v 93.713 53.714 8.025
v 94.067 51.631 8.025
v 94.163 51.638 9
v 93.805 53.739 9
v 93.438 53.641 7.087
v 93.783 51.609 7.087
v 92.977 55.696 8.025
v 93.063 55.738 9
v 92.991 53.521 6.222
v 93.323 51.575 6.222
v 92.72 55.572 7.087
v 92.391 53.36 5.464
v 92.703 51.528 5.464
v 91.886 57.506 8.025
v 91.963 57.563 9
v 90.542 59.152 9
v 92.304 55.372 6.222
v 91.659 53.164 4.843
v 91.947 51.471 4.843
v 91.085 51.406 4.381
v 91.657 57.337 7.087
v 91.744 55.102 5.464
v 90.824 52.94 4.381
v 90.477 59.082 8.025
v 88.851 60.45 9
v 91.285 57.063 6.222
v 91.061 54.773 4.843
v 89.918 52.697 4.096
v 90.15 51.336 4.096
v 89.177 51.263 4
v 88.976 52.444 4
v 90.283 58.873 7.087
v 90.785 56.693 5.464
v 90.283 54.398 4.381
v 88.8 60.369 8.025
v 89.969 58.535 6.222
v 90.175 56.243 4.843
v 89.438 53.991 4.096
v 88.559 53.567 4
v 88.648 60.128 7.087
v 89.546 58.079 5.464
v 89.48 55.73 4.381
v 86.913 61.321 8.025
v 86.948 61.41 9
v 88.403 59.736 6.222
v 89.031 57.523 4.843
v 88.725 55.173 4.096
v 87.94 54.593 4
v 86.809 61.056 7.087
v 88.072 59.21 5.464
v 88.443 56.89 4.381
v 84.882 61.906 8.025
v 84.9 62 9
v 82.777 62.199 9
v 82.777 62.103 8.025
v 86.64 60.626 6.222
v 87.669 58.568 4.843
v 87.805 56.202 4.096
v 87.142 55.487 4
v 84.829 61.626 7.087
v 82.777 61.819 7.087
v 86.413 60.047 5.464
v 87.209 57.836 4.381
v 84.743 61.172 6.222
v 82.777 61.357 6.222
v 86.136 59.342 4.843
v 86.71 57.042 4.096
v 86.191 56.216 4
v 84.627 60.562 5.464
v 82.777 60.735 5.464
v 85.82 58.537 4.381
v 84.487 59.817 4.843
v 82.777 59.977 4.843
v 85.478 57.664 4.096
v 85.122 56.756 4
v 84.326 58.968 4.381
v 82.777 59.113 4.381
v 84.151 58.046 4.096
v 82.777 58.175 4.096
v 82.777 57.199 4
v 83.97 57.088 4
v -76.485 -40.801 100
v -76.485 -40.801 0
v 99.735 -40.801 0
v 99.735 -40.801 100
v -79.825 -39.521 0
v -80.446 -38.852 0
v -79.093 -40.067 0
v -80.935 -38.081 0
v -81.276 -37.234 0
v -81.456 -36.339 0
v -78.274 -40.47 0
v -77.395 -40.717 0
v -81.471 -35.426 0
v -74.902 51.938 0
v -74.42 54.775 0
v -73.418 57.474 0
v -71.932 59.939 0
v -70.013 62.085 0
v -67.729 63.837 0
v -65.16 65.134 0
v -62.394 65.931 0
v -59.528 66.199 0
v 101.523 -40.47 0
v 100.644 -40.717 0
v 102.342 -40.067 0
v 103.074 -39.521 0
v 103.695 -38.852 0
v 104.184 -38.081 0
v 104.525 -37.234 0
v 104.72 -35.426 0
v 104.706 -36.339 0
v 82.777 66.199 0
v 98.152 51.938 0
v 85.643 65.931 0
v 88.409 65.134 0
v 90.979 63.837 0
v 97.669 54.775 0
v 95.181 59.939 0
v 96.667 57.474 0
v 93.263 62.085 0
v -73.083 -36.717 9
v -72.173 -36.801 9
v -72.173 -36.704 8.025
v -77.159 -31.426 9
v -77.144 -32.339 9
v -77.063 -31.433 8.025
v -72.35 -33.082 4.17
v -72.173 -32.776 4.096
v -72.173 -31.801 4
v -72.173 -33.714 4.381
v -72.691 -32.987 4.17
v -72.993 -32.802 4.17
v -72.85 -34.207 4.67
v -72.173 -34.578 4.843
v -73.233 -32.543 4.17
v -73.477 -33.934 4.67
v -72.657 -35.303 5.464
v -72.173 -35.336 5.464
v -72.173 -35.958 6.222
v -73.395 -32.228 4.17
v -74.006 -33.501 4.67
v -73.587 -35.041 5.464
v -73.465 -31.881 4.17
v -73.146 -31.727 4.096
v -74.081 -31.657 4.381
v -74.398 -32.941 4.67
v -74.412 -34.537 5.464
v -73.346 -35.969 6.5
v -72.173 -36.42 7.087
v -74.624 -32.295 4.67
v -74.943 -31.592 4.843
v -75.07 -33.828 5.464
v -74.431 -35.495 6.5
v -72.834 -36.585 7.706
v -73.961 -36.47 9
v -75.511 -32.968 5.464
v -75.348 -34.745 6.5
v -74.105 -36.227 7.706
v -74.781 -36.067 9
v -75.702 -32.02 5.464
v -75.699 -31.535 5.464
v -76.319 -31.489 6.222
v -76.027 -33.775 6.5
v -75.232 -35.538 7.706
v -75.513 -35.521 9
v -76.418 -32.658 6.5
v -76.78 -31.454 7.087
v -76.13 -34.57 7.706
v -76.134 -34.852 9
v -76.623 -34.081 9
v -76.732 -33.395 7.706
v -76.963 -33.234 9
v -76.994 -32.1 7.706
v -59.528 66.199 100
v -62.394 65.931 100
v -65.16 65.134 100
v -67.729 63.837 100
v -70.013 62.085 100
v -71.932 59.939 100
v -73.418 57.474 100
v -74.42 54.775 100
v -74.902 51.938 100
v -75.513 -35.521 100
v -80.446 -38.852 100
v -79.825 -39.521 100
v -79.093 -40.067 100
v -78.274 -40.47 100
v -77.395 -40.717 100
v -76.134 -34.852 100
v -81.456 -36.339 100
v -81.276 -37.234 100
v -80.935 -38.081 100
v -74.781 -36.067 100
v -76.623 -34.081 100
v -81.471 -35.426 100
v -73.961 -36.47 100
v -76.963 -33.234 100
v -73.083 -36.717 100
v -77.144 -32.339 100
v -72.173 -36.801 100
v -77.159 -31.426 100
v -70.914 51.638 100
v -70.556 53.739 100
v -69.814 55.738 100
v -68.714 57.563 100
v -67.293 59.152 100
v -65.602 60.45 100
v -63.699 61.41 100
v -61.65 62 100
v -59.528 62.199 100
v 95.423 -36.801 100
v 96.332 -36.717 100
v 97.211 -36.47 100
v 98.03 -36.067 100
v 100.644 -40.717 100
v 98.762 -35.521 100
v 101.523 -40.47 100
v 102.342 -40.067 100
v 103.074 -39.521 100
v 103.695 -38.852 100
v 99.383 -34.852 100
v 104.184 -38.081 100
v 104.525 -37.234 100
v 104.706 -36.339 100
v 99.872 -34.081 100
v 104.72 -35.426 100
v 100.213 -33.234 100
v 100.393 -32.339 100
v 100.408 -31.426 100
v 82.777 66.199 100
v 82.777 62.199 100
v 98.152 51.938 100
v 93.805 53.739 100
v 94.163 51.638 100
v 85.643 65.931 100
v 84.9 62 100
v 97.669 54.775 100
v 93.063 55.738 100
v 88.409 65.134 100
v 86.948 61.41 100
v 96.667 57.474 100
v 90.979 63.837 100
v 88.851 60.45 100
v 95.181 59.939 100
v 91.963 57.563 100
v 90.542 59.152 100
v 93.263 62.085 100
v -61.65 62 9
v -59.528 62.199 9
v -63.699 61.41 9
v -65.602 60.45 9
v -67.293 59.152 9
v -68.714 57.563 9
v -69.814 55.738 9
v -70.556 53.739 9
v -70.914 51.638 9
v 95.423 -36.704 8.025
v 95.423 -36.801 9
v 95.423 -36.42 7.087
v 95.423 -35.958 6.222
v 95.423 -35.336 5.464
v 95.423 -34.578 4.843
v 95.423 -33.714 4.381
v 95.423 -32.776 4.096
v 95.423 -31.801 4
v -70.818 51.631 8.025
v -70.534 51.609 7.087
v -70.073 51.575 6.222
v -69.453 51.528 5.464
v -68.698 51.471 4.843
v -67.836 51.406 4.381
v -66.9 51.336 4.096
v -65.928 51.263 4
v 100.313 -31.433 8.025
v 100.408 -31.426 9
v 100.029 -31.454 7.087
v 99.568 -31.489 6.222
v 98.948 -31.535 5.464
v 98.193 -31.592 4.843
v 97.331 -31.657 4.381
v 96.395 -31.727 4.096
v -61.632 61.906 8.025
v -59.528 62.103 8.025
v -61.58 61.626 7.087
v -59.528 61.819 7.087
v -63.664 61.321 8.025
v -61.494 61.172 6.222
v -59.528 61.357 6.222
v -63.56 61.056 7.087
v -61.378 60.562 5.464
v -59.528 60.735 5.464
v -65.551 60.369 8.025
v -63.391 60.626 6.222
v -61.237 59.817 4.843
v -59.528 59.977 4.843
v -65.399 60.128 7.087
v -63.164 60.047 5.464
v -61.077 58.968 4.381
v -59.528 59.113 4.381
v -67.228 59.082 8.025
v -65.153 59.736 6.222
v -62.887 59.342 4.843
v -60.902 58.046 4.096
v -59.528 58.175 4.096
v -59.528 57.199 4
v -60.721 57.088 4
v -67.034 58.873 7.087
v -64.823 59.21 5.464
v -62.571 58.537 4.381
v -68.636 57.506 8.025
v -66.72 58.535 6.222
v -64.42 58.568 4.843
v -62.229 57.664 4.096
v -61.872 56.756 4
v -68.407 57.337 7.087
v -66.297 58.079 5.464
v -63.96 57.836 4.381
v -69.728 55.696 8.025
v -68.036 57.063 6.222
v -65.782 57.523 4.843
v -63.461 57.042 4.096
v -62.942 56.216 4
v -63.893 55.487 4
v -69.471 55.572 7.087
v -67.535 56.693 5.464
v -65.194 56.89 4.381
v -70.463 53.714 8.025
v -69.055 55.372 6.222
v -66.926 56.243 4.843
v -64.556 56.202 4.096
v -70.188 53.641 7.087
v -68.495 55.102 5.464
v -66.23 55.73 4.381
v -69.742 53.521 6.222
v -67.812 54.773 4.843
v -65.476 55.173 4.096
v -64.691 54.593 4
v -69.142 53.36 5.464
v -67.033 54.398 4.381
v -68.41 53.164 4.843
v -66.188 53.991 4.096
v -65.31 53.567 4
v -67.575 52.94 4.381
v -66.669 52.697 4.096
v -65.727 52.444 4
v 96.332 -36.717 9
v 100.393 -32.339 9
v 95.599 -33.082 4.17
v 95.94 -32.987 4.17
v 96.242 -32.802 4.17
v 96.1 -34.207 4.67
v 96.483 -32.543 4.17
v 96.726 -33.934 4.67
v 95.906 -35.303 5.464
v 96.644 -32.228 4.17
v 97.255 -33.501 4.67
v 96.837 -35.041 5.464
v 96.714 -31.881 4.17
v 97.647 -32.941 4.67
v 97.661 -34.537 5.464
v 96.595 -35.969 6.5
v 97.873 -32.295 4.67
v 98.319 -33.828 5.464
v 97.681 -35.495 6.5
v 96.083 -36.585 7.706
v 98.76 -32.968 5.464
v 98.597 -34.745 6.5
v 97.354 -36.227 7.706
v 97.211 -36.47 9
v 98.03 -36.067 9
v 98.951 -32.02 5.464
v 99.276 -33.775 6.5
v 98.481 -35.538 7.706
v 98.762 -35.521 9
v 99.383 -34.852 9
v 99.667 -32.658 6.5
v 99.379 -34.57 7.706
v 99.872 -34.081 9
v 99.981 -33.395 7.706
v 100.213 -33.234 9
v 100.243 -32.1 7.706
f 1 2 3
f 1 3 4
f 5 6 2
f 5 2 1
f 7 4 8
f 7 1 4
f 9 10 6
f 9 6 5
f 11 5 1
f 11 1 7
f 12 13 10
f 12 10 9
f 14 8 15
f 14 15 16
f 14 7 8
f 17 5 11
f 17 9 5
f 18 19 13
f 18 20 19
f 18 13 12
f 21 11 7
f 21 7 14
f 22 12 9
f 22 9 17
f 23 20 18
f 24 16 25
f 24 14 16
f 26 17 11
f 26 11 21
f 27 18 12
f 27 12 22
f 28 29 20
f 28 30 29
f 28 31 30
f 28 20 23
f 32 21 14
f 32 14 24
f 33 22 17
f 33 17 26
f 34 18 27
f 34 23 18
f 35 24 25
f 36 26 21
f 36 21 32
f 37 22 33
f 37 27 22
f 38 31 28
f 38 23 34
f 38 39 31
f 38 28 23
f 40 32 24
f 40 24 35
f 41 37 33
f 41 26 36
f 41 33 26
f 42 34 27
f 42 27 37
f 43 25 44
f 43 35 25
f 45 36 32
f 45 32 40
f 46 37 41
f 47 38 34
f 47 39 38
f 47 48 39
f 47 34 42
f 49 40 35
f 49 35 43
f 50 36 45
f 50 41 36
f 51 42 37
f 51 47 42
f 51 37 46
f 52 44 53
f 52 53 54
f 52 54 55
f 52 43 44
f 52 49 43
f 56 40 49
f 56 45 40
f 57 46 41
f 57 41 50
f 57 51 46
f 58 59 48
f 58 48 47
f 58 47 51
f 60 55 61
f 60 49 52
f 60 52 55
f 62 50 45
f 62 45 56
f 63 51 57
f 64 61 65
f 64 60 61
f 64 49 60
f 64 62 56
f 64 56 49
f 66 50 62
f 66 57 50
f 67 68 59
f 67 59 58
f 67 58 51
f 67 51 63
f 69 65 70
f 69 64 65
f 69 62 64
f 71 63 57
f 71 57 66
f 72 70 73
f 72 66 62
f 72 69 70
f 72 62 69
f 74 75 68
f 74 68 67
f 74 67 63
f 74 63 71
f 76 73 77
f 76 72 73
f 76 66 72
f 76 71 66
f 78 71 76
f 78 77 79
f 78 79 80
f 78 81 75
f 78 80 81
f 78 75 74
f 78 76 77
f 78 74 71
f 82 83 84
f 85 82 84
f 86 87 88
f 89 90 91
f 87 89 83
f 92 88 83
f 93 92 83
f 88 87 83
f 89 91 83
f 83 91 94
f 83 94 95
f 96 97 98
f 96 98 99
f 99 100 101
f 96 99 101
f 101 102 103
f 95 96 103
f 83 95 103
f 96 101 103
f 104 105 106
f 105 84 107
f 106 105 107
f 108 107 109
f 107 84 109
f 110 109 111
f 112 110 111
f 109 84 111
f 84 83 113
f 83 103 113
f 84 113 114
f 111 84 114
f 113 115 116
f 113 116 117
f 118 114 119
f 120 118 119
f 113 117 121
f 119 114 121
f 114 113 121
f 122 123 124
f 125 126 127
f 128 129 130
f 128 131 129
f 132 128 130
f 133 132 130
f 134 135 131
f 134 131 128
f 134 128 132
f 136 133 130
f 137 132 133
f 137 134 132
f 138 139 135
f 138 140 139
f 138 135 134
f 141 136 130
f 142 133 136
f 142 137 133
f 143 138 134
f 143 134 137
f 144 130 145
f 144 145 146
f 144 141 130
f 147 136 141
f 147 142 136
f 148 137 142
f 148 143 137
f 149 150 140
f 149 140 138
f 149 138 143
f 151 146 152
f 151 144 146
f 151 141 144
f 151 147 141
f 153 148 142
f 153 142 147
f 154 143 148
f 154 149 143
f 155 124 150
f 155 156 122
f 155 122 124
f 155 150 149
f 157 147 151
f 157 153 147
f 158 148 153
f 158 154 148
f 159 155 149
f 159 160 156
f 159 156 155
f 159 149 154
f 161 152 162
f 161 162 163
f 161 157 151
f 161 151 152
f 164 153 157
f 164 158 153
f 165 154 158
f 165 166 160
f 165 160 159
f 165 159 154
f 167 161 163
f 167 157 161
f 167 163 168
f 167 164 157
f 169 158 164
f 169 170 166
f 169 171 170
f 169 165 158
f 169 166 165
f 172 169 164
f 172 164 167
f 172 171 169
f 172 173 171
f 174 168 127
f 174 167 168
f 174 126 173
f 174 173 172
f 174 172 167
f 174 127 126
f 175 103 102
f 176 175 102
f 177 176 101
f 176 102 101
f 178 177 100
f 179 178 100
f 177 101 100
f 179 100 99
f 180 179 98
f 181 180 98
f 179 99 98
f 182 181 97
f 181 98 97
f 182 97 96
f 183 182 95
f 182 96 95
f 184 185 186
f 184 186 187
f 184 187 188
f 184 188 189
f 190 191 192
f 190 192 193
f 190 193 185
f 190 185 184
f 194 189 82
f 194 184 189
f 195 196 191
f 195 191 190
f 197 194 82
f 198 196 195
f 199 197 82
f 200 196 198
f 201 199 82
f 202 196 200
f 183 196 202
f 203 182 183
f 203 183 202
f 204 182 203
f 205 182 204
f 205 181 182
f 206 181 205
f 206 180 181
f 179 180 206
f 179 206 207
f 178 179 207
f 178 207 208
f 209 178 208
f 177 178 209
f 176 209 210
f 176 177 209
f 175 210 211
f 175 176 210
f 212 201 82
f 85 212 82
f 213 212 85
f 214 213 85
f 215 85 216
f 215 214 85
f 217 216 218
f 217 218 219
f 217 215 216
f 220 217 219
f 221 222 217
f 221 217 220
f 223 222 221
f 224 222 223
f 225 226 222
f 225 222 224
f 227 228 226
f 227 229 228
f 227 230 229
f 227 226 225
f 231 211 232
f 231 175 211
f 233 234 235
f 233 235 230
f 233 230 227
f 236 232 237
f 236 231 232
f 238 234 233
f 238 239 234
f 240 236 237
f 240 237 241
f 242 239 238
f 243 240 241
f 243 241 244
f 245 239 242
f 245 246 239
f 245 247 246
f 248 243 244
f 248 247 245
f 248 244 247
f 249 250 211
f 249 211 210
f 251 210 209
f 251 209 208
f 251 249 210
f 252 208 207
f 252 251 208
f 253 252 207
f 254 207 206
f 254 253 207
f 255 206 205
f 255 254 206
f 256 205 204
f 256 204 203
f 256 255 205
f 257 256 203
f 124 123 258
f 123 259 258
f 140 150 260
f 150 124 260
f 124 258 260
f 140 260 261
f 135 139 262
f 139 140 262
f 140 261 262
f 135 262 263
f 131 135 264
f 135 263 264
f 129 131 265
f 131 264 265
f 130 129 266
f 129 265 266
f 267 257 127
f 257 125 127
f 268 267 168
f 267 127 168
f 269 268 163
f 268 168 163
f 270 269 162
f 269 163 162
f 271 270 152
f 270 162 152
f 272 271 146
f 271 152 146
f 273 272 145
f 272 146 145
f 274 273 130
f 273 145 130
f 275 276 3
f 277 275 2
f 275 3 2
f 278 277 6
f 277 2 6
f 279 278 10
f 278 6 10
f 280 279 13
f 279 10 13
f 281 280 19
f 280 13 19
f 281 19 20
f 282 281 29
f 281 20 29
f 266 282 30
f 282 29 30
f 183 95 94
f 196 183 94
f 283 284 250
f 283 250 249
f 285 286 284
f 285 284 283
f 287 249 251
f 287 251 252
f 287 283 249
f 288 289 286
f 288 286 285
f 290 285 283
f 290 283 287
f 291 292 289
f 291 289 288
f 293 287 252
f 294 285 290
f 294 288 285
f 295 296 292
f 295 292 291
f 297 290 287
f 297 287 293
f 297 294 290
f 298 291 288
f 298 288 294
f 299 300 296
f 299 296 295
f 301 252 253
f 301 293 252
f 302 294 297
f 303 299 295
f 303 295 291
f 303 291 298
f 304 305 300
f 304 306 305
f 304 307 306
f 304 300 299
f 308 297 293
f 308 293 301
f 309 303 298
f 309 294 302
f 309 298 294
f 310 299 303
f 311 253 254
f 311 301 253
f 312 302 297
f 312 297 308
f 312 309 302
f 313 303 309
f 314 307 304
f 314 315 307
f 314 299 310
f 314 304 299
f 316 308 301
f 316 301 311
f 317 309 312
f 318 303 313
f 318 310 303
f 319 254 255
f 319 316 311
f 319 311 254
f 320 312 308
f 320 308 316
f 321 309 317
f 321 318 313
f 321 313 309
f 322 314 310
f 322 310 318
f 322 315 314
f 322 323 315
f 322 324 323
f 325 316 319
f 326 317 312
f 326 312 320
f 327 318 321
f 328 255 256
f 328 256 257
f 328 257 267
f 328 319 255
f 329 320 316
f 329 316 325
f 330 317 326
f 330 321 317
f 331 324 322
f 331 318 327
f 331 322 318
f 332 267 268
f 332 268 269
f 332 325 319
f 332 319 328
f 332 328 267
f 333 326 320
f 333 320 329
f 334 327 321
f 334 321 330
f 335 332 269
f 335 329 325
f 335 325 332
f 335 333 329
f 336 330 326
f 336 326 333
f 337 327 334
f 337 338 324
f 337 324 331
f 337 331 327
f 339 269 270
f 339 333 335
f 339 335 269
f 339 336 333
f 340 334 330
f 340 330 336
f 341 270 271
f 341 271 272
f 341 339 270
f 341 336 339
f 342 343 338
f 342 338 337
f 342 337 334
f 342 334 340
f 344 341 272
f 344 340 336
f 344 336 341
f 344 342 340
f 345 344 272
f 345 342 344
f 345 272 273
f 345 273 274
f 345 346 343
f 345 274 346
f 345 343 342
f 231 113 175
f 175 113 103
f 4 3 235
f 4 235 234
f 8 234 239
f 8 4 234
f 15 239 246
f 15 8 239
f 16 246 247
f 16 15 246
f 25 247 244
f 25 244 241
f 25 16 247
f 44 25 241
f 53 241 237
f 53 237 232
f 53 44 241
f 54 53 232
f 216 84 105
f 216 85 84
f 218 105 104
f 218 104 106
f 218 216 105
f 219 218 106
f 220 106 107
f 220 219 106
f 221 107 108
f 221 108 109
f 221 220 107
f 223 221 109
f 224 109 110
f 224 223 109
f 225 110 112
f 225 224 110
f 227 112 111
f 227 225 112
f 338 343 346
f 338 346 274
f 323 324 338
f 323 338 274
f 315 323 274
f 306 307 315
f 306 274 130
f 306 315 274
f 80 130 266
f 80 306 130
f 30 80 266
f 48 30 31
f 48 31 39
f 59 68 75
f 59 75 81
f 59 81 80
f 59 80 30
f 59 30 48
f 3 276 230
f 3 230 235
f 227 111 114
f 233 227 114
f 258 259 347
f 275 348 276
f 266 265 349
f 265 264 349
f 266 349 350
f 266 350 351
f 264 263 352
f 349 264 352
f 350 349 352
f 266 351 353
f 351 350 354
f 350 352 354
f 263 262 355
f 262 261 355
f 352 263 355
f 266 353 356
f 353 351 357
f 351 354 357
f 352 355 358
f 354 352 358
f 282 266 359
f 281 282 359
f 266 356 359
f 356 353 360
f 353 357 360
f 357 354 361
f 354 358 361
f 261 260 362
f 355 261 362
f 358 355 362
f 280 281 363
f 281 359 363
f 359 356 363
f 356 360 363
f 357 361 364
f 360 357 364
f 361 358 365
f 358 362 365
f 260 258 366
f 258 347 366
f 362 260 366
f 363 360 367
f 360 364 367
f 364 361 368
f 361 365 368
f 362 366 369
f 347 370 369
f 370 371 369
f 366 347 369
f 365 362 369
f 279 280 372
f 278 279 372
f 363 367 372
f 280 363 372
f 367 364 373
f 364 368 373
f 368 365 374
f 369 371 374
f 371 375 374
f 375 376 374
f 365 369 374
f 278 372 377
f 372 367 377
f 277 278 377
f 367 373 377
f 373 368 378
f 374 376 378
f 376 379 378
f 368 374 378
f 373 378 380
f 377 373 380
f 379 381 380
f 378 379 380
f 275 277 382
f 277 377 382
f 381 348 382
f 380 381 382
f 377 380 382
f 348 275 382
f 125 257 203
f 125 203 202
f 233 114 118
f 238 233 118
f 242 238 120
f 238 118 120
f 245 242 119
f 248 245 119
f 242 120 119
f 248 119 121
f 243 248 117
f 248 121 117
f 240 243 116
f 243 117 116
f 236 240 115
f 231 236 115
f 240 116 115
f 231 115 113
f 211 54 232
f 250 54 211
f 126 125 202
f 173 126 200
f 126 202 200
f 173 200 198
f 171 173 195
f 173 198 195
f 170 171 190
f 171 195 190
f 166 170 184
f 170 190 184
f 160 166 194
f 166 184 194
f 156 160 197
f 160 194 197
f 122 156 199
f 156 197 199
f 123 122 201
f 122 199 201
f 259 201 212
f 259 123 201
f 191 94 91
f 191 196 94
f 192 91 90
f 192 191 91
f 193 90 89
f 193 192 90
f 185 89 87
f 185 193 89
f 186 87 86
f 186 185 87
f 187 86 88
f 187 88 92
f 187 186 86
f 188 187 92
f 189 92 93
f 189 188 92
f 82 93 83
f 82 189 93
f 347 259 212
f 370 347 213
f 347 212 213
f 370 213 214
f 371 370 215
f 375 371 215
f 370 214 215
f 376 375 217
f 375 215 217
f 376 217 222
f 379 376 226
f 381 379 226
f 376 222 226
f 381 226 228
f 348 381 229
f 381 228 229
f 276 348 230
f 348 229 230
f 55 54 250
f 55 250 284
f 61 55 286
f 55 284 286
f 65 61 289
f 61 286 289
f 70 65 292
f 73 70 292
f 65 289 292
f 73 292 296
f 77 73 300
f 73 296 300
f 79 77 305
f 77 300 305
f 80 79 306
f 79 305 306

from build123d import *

# Parameters (mm, degrees)
F1_DEPTH = 100
F2_T     = -4
F3_R     = 5


with BuildPart() as f1:
    # F0 (on Top) → F1 (new body)
    with BuildSketch(Plane.XY):
        with BuildLine():
            Line((-74.9023482991, 51.9376612258), (-81.8753698939, -40.8005561921))
            Line((-81.8753698939, -40.8005561921), (105.1246301061, -40.8005561921))
            Line((105.1246301061, -40.8005561921), (98.1516085112, 51.9376612258))
            ThreePointArc((98.1516085112, 51.9376612258), (93.2625692956, 62.0850012182), (82.7772187745, 66.1994438079))
            Line((82.7772187745, 66.1994438079), (-59.5279585624, 66.1994438079))
            ThreePointArc((-59.5279585624, 66.1994438079), (-70.0133090834, 62.0850012182), (-74.9023482991, 51.9376612258))
        make_face()
    extrude(amount=F1_DEPTH)

    # F2
    f2_openings = [f1.faces().sort_by_distance(p)[0] for p in [
        (11.62463, 11.668388, 100),
    ]]
    offset(amount=F2_T, openings=f2_openings)

    # F3
    f3_edges = [f1.edges().sort_by_distance(p)[0] for p in [
        (105.12463, -40.800556, 50),
        (-81.87537, -40.800556, 50),
        (100.812577, -36.800556, 52),
        (-77.563317, -36.800556, 52),
        (11.62463, -36.800556, 4),
        (97.487723, 7.418595, 4),
    ]]
    fillet(f3_edges, radius=F3_R)


solid = f1.part
